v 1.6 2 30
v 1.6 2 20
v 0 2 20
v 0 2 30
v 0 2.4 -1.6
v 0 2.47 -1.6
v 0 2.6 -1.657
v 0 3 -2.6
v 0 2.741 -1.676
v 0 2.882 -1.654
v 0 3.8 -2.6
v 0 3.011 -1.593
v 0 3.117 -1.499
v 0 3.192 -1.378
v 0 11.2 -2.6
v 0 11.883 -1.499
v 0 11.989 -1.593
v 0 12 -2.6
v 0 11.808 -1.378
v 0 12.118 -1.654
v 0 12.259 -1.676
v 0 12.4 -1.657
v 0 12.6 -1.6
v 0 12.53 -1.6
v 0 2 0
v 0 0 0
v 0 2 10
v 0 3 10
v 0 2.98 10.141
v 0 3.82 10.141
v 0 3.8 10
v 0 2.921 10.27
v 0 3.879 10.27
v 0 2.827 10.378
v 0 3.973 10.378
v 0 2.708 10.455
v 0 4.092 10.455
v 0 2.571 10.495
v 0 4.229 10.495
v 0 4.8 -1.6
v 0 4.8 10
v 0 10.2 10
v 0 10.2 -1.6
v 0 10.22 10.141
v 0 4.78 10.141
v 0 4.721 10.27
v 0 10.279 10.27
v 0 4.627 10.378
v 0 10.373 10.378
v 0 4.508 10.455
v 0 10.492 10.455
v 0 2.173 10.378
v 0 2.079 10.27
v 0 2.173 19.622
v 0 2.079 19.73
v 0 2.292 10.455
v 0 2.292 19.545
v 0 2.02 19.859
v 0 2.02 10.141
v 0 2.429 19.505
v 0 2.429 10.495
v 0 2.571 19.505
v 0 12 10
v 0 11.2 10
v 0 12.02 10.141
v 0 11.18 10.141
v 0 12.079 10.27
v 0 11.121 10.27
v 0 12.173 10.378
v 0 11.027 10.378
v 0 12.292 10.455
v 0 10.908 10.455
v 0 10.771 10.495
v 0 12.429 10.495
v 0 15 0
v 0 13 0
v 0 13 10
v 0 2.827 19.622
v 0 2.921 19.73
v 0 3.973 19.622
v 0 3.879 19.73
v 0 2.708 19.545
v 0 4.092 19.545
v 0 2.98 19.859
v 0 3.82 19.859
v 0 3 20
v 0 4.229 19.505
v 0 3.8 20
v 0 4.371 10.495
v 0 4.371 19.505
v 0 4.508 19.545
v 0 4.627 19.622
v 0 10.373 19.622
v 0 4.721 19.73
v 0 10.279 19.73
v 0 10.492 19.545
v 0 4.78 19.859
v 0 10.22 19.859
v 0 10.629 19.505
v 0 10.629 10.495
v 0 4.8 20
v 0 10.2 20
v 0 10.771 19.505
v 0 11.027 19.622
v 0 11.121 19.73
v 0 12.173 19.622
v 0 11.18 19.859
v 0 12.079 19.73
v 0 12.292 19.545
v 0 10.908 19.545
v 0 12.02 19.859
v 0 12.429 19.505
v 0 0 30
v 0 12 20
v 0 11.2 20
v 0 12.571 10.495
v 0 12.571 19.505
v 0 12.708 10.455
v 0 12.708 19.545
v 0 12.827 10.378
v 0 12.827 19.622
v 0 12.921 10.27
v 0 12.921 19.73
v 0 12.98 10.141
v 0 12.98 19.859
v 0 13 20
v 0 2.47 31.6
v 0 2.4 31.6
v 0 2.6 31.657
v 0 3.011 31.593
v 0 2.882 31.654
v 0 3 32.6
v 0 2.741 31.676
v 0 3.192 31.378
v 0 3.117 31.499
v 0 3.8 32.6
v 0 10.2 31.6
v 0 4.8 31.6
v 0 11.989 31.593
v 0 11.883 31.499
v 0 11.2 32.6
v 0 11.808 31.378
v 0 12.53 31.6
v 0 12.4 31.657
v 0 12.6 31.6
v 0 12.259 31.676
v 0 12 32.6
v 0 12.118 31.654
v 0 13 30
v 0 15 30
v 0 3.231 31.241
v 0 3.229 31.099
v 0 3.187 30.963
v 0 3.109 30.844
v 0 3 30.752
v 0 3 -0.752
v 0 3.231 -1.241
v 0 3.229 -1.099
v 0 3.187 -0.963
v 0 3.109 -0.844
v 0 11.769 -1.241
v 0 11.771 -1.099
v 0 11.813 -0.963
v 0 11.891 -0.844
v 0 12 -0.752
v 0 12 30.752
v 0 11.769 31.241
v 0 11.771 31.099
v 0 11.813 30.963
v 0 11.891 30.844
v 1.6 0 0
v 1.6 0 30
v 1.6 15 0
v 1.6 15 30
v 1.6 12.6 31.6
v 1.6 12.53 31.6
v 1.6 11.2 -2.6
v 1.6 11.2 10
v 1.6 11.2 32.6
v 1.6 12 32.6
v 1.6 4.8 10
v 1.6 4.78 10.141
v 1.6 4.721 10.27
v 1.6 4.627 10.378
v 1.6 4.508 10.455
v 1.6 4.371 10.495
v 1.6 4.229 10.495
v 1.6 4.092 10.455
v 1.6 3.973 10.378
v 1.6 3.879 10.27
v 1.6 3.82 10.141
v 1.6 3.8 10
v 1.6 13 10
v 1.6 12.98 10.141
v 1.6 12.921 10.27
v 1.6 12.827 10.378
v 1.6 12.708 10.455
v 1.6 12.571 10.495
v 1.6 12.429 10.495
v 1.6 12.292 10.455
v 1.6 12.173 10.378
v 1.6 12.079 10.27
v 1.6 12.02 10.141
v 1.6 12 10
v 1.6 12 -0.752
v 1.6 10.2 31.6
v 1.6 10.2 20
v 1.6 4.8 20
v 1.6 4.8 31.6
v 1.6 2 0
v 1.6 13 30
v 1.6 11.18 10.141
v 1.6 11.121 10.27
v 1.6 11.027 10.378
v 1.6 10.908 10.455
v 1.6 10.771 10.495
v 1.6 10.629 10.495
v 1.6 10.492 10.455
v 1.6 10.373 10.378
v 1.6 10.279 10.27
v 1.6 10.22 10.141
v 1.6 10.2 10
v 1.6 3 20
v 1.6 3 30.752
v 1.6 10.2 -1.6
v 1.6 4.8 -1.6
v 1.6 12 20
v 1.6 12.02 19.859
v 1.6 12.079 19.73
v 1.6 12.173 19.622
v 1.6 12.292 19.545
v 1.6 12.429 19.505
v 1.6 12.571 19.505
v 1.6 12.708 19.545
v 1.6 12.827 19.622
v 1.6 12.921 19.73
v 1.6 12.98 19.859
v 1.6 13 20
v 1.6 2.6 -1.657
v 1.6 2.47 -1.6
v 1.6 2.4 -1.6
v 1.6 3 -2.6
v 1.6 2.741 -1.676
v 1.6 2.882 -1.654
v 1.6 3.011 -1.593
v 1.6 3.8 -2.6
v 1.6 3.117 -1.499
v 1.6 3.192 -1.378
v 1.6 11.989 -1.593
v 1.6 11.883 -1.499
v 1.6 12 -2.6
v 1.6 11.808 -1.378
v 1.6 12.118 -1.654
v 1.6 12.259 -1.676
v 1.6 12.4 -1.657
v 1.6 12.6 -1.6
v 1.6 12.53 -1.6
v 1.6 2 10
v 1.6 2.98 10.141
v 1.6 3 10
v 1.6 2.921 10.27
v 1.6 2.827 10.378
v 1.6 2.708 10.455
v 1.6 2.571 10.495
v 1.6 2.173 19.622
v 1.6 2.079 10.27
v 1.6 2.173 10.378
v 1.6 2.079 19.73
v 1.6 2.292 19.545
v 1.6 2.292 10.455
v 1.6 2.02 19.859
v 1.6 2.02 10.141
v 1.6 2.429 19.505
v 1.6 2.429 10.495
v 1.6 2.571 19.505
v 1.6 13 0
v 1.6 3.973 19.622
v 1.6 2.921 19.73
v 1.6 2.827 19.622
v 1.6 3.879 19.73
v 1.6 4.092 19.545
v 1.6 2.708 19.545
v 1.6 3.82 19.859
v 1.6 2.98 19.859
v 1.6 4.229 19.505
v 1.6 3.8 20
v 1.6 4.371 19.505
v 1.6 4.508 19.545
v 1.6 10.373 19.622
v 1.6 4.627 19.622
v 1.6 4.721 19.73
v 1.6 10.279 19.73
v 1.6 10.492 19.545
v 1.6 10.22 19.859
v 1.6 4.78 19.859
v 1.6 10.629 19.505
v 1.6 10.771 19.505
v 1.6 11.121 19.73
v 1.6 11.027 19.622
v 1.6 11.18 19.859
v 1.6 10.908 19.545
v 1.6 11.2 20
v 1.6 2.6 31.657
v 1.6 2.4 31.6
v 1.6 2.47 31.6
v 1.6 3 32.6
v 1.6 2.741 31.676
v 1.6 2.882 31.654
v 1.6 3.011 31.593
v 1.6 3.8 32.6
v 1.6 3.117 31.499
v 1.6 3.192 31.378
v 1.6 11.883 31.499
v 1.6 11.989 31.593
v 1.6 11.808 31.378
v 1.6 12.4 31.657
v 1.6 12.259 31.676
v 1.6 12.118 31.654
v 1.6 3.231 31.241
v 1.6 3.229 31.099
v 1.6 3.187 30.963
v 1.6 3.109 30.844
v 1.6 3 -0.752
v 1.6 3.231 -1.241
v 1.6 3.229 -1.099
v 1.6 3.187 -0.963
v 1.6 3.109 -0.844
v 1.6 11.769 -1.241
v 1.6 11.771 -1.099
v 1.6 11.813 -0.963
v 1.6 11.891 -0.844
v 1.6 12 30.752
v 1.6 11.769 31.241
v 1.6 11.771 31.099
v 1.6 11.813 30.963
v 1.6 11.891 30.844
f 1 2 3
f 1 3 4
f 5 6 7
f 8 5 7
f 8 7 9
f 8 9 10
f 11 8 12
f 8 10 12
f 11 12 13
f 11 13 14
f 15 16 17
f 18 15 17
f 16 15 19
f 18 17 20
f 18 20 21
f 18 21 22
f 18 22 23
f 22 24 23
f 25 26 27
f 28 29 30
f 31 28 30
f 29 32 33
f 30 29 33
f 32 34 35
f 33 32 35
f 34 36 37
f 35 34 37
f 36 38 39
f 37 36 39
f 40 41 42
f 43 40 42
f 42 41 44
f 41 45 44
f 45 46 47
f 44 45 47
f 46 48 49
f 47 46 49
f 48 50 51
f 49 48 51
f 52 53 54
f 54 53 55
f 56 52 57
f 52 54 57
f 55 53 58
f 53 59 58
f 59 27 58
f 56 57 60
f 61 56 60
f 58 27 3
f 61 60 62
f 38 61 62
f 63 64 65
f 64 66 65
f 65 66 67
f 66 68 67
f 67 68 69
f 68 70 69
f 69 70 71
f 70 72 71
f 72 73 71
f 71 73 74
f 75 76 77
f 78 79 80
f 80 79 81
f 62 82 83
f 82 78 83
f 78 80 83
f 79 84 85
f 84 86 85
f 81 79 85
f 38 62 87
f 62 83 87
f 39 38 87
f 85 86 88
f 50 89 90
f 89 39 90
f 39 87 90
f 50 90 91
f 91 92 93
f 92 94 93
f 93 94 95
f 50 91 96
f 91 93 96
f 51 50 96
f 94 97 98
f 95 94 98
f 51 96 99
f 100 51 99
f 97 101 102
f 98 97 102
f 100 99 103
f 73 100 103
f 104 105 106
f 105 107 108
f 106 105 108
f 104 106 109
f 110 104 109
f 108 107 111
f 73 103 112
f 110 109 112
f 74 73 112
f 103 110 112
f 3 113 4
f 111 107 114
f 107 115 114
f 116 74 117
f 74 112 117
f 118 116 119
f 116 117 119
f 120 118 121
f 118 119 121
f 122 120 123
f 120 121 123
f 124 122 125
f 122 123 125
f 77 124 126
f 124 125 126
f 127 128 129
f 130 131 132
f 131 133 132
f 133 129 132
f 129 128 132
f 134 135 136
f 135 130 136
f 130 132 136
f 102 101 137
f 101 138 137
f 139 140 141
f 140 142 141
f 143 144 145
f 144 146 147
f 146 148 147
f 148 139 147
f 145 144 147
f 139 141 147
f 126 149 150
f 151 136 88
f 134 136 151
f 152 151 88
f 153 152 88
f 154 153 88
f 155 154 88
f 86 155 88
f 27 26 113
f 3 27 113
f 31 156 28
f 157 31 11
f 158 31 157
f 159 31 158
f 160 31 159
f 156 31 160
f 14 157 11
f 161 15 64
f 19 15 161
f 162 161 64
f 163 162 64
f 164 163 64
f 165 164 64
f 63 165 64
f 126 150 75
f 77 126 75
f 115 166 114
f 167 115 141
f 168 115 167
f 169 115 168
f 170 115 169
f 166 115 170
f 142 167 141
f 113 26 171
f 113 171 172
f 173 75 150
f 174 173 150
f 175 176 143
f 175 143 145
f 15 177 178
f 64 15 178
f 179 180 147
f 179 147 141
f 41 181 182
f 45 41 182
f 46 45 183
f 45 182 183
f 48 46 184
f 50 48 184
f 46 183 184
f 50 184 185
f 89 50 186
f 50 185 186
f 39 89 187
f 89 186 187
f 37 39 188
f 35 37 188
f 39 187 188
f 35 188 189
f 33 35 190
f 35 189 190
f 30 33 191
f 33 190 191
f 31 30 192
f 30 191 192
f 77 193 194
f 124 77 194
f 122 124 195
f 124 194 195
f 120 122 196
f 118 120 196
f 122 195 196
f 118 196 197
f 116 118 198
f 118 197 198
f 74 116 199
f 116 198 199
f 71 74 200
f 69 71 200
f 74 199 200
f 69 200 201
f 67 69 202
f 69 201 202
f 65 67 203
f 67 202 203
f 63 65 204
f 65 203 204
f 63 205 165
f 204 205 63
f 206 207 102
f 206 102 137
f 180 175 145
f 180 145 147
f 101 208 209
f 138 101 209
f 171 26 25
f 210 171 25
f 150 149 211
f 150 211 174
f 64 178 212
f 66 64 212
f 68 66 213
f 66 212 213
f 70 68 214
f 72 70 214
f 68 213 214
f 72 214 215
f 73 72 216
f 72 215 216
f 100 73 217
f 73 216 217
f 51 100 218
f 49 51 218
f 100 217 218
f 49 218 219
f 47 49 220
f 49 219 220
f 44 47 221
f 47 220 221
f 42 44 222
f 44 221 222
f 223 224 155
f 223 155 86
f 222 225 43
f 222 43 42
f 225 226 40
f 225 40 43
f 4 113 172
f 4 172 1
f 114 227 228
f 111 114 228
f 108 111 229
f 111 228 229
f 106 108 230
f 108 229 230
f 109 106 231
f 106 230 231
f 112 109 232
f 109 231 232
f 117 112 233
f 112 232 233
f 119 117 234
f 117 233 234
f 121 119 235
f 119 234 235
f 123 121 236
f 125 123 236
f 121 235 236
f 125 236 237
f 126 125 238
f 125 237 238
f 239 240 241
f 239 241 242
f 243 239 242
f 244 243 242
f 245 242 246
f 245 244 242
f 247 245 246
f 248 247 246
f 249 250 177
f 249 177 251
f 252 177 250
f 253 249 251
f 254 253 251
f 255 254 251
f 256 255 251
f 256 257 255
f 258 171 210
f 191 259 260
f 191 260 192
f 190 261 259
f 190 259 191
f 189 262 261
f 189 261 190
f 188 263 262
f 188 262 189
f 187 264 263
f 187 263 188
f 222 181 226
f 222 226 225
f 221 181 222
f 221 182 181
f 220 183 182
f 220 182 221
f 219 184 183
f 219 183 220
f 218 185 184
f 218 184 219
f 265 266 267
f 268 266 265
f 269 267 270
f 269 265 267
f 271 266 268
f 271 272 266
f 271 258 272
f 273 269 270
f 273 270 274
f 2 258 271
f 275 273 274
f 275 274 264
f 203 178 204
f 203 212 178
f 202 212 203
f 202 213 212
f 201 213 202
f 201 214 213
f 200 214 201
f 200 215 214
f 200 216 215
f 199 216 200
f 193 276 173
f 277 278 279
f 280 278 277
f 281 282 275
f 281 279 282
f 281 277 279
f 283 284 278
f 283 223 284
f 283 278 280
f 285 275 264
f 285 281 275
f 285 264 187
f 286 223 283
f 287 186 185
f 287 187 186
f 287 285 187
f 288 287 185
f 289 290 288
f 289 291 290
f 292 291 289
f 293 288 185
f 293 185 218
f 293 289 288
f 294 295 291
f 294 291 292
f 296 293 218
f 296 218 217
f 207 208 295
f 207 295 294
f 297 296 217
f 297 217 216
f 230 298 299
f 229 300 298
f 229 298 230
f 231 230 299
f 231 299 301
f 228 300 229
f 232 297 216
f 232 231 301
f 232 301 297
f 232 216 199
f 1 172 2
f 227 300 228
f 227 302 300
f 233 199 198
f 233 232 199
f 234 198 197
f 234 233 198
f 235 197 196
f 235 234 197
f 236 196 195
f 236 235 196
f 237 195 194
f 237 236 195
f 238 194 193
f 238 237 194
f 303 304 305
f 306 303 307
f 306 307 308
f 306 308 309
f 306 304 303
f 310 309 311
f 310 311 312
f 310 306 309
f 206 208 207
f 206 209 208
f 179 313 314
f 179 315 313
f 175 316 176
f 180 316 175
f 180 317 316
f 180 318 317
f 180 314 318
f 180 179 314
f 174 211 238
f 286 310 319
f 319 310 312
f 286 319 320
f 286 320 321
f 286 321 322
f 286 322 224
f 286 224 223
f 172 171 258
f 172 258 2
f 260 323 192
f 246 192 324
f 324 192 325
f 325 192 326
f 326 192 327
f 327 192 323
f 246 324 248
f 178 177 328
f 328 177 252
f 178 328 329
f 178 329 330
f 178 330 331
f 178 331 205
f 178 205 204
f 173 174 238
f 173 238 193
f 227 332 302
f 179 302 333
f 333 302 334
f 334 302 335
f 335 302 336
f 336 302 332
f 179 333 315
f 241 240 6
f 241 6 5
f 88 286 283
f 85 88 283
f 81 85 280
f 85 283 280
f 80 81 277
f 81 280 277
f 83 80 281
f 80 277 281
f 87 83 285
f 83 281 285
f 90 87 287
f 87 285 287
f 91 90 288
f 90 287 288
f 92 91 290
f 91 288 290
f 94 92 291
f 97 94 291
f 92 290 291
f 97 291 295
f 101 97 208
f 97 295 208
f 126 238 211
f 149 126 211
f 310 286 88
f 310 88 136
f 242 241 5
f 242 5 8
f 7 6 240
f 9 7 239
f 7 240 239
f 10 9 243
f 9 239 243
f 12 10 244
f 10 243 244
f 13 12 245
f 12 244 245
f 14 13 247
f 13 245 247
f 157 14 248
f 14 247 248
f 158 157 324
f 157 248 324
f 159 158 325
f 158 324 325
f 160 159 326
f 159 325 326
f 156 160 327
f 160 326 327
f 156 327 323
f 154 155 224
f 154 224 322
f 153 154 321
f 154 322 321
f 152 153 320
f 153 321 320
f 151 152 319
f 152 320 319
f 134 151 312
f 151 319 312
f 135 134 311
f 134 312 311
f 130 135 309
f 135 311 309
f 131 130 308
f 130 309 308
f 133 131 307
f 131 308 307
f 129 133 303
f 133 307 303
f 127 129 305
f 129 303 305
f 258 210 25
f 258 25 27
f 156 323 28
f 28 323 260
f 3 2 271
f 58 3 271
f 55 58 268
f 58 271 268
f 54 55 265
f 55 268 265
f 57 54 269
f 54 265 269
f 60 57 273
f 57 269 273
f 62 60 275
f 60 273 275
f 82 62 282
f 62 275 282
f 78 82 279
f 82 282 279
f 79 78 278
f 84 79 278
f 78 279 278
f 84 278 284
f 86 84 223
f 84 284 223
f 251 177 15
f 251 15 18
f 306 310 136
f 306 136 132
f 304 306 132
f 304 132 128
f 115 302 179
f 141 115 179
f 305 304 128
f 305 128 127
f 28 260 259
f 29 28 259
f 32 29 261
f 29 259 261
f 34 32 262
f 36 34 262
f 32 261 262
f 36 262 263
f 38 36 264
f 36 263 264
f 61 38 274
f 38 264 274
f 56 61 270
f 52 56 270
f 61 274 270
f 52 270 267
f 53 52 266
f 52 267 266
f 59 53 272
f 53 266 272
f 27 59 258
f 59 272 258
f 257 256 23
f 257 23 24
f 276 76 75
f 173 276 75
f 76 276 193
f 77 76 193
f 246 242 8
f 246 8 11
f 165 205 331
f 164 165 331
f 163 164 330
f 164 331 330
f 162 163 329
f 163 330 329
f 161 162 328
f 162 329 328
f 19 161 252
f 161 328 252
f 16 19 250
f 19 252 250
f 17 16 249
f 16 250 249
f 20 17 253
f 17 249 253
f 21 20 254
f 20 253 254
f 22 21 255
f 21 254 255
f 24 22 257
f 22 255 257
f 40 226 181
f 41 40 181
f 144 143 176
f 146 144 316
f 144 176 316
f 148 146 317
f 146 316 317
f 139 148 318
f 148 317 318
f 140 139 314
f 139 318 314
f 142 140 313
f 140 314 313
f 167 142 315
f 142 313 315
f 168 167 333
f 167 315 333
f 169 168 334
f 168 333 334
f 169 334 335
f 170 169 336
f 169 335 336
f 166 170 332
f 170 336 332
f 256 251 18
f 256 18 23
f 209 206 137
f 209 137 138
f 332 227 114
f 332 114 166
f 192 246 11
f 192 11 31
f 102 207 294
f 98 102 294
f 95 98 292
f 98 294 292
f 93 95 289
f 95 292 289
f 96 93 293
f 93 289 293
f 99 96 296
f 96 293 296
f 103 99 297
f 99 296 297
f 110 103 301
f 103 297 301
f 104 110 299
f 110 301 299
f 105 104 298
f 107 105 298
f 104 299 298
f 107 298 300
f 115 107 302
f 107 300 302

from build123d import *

# Parameters (mm, degrees)
F3_W     = 15
F3_H     = 30
F4_DEPTH = 1.6
F5_W     = 1
F5_H     = 10
F0_DEPTH = 25
F6_W     = 2.7
F6_H     = 1.6
F1_DEPTH = 1.6
F2_R     = 0.5
F7_DEPTH = 25


with BuildPart() as f4:
    # F3 (on Right) → F4 (new body)
    with BuildSketch(Plane.YZ):
        with Locations((7.5, 15)):
            Rectangle(F3_W, F3_H)
    extrude(amount=F4_DEPTH)

    # F5 (on face) → F0 (cut)
    with BuildSketch(Plane.YZ.offset(1.6)):
        with Locations((2.5, 25)):
            Rectangle(F5_W, F5_H)
        with Locations((4.3, 25)):
            Rectangle(F5_W, F5_H)
        with Locations((10.7, 25)):
            Rectangle(F5_W, F5_H)
        with Locations((12.5, 25)):
            Rectangle(F5_W, F5_H)
        with Locations((12.5, 5)):
            Rectangle(F5_W, F5_H)
        with Locations((10.7, 5)):
            Rectangle(F5_W, F5_H)
        with Locations((4.3, 5)):
            Rectangle(F5_W, F5_H)
        with Locations((2.5, 5)):
            Rectangle(F5_W, F5_H)
    extrude(amount=-F0_DEPTH, mode=Mode.SUBTRACT)

    # F6 (on face) → F1 (join)
    with BuildSketch(Plane.YZ.offset(1.6)):
        Polygon((3, 30), (3.8, 30), (3.8, 32.6), (3, 32.6), (2.4, 31.6), (3, 31.6), align=None)
        with Locations((6.15, 30.8)):
            Rectangle(F6_W, F6_H)
        with Locations((8.85, 30.8)):
            Rectangle(F6_W, F6_H)
        Polygon((12, 32.6), (11.2, 32.6), (11.2, 30), (12, 30), (12, 31.6), (12.6, 31.6), align=None)
        Polygon((2.4, -1.6), (3, -2.6), (3.8, -2.6), (3.8, 0), (3, 0), (3, -1.6), align=None)
        Polygon((4.8, 0), (4.8, -1.6), (7.5, -1.6), (10.2, -1.6), (10.2, 0), (7.5, 0), align=None)
        Polygon((12, 0), (11.2, 0), (11.2, -2.6), (12, -2.6), (12.6, -1.6), (12, -1.6), align=None)
    extrude(amount=-F1_DEPTH)

    # F2 (on face) → F7 (cut)
    with BuildSketch(Plane.YZ.offset(1.6)):
        with Locations((4.3, 20)):
            Circle(F2_R)
        with Locations((2.735001, 31.176001)):
            Circle(F2_R)
        with Locations((2.5, 20)):
            Circle(F2_R)
        with Locations((10.7, 20)):
            Circle(F2_R)
        with Locations((12.5, 20)):
            Circle(F2_R)
        with Locations((12.264999, 31.176001)):
            Circle(F2_R)
        with Locations((12.264999, -1.176001)):
            Circle(F2_R)
        with Locations((12.5, 10)):
            Circle(F2_R)
        with Locations((10.7, 10)):
            Circle(F2_R)
        with Locations((4.3, 10)):
            Circle(F2_R)
        with Locations((2.5, 10)):
            Circle(F2_R)
        with Locations((2.735001, -1.176001)):
            Circle(F2_R)
    extrude(amount=-F7_DEPTH, mode=Mode.SUBTRACT)


solid = f4.part
